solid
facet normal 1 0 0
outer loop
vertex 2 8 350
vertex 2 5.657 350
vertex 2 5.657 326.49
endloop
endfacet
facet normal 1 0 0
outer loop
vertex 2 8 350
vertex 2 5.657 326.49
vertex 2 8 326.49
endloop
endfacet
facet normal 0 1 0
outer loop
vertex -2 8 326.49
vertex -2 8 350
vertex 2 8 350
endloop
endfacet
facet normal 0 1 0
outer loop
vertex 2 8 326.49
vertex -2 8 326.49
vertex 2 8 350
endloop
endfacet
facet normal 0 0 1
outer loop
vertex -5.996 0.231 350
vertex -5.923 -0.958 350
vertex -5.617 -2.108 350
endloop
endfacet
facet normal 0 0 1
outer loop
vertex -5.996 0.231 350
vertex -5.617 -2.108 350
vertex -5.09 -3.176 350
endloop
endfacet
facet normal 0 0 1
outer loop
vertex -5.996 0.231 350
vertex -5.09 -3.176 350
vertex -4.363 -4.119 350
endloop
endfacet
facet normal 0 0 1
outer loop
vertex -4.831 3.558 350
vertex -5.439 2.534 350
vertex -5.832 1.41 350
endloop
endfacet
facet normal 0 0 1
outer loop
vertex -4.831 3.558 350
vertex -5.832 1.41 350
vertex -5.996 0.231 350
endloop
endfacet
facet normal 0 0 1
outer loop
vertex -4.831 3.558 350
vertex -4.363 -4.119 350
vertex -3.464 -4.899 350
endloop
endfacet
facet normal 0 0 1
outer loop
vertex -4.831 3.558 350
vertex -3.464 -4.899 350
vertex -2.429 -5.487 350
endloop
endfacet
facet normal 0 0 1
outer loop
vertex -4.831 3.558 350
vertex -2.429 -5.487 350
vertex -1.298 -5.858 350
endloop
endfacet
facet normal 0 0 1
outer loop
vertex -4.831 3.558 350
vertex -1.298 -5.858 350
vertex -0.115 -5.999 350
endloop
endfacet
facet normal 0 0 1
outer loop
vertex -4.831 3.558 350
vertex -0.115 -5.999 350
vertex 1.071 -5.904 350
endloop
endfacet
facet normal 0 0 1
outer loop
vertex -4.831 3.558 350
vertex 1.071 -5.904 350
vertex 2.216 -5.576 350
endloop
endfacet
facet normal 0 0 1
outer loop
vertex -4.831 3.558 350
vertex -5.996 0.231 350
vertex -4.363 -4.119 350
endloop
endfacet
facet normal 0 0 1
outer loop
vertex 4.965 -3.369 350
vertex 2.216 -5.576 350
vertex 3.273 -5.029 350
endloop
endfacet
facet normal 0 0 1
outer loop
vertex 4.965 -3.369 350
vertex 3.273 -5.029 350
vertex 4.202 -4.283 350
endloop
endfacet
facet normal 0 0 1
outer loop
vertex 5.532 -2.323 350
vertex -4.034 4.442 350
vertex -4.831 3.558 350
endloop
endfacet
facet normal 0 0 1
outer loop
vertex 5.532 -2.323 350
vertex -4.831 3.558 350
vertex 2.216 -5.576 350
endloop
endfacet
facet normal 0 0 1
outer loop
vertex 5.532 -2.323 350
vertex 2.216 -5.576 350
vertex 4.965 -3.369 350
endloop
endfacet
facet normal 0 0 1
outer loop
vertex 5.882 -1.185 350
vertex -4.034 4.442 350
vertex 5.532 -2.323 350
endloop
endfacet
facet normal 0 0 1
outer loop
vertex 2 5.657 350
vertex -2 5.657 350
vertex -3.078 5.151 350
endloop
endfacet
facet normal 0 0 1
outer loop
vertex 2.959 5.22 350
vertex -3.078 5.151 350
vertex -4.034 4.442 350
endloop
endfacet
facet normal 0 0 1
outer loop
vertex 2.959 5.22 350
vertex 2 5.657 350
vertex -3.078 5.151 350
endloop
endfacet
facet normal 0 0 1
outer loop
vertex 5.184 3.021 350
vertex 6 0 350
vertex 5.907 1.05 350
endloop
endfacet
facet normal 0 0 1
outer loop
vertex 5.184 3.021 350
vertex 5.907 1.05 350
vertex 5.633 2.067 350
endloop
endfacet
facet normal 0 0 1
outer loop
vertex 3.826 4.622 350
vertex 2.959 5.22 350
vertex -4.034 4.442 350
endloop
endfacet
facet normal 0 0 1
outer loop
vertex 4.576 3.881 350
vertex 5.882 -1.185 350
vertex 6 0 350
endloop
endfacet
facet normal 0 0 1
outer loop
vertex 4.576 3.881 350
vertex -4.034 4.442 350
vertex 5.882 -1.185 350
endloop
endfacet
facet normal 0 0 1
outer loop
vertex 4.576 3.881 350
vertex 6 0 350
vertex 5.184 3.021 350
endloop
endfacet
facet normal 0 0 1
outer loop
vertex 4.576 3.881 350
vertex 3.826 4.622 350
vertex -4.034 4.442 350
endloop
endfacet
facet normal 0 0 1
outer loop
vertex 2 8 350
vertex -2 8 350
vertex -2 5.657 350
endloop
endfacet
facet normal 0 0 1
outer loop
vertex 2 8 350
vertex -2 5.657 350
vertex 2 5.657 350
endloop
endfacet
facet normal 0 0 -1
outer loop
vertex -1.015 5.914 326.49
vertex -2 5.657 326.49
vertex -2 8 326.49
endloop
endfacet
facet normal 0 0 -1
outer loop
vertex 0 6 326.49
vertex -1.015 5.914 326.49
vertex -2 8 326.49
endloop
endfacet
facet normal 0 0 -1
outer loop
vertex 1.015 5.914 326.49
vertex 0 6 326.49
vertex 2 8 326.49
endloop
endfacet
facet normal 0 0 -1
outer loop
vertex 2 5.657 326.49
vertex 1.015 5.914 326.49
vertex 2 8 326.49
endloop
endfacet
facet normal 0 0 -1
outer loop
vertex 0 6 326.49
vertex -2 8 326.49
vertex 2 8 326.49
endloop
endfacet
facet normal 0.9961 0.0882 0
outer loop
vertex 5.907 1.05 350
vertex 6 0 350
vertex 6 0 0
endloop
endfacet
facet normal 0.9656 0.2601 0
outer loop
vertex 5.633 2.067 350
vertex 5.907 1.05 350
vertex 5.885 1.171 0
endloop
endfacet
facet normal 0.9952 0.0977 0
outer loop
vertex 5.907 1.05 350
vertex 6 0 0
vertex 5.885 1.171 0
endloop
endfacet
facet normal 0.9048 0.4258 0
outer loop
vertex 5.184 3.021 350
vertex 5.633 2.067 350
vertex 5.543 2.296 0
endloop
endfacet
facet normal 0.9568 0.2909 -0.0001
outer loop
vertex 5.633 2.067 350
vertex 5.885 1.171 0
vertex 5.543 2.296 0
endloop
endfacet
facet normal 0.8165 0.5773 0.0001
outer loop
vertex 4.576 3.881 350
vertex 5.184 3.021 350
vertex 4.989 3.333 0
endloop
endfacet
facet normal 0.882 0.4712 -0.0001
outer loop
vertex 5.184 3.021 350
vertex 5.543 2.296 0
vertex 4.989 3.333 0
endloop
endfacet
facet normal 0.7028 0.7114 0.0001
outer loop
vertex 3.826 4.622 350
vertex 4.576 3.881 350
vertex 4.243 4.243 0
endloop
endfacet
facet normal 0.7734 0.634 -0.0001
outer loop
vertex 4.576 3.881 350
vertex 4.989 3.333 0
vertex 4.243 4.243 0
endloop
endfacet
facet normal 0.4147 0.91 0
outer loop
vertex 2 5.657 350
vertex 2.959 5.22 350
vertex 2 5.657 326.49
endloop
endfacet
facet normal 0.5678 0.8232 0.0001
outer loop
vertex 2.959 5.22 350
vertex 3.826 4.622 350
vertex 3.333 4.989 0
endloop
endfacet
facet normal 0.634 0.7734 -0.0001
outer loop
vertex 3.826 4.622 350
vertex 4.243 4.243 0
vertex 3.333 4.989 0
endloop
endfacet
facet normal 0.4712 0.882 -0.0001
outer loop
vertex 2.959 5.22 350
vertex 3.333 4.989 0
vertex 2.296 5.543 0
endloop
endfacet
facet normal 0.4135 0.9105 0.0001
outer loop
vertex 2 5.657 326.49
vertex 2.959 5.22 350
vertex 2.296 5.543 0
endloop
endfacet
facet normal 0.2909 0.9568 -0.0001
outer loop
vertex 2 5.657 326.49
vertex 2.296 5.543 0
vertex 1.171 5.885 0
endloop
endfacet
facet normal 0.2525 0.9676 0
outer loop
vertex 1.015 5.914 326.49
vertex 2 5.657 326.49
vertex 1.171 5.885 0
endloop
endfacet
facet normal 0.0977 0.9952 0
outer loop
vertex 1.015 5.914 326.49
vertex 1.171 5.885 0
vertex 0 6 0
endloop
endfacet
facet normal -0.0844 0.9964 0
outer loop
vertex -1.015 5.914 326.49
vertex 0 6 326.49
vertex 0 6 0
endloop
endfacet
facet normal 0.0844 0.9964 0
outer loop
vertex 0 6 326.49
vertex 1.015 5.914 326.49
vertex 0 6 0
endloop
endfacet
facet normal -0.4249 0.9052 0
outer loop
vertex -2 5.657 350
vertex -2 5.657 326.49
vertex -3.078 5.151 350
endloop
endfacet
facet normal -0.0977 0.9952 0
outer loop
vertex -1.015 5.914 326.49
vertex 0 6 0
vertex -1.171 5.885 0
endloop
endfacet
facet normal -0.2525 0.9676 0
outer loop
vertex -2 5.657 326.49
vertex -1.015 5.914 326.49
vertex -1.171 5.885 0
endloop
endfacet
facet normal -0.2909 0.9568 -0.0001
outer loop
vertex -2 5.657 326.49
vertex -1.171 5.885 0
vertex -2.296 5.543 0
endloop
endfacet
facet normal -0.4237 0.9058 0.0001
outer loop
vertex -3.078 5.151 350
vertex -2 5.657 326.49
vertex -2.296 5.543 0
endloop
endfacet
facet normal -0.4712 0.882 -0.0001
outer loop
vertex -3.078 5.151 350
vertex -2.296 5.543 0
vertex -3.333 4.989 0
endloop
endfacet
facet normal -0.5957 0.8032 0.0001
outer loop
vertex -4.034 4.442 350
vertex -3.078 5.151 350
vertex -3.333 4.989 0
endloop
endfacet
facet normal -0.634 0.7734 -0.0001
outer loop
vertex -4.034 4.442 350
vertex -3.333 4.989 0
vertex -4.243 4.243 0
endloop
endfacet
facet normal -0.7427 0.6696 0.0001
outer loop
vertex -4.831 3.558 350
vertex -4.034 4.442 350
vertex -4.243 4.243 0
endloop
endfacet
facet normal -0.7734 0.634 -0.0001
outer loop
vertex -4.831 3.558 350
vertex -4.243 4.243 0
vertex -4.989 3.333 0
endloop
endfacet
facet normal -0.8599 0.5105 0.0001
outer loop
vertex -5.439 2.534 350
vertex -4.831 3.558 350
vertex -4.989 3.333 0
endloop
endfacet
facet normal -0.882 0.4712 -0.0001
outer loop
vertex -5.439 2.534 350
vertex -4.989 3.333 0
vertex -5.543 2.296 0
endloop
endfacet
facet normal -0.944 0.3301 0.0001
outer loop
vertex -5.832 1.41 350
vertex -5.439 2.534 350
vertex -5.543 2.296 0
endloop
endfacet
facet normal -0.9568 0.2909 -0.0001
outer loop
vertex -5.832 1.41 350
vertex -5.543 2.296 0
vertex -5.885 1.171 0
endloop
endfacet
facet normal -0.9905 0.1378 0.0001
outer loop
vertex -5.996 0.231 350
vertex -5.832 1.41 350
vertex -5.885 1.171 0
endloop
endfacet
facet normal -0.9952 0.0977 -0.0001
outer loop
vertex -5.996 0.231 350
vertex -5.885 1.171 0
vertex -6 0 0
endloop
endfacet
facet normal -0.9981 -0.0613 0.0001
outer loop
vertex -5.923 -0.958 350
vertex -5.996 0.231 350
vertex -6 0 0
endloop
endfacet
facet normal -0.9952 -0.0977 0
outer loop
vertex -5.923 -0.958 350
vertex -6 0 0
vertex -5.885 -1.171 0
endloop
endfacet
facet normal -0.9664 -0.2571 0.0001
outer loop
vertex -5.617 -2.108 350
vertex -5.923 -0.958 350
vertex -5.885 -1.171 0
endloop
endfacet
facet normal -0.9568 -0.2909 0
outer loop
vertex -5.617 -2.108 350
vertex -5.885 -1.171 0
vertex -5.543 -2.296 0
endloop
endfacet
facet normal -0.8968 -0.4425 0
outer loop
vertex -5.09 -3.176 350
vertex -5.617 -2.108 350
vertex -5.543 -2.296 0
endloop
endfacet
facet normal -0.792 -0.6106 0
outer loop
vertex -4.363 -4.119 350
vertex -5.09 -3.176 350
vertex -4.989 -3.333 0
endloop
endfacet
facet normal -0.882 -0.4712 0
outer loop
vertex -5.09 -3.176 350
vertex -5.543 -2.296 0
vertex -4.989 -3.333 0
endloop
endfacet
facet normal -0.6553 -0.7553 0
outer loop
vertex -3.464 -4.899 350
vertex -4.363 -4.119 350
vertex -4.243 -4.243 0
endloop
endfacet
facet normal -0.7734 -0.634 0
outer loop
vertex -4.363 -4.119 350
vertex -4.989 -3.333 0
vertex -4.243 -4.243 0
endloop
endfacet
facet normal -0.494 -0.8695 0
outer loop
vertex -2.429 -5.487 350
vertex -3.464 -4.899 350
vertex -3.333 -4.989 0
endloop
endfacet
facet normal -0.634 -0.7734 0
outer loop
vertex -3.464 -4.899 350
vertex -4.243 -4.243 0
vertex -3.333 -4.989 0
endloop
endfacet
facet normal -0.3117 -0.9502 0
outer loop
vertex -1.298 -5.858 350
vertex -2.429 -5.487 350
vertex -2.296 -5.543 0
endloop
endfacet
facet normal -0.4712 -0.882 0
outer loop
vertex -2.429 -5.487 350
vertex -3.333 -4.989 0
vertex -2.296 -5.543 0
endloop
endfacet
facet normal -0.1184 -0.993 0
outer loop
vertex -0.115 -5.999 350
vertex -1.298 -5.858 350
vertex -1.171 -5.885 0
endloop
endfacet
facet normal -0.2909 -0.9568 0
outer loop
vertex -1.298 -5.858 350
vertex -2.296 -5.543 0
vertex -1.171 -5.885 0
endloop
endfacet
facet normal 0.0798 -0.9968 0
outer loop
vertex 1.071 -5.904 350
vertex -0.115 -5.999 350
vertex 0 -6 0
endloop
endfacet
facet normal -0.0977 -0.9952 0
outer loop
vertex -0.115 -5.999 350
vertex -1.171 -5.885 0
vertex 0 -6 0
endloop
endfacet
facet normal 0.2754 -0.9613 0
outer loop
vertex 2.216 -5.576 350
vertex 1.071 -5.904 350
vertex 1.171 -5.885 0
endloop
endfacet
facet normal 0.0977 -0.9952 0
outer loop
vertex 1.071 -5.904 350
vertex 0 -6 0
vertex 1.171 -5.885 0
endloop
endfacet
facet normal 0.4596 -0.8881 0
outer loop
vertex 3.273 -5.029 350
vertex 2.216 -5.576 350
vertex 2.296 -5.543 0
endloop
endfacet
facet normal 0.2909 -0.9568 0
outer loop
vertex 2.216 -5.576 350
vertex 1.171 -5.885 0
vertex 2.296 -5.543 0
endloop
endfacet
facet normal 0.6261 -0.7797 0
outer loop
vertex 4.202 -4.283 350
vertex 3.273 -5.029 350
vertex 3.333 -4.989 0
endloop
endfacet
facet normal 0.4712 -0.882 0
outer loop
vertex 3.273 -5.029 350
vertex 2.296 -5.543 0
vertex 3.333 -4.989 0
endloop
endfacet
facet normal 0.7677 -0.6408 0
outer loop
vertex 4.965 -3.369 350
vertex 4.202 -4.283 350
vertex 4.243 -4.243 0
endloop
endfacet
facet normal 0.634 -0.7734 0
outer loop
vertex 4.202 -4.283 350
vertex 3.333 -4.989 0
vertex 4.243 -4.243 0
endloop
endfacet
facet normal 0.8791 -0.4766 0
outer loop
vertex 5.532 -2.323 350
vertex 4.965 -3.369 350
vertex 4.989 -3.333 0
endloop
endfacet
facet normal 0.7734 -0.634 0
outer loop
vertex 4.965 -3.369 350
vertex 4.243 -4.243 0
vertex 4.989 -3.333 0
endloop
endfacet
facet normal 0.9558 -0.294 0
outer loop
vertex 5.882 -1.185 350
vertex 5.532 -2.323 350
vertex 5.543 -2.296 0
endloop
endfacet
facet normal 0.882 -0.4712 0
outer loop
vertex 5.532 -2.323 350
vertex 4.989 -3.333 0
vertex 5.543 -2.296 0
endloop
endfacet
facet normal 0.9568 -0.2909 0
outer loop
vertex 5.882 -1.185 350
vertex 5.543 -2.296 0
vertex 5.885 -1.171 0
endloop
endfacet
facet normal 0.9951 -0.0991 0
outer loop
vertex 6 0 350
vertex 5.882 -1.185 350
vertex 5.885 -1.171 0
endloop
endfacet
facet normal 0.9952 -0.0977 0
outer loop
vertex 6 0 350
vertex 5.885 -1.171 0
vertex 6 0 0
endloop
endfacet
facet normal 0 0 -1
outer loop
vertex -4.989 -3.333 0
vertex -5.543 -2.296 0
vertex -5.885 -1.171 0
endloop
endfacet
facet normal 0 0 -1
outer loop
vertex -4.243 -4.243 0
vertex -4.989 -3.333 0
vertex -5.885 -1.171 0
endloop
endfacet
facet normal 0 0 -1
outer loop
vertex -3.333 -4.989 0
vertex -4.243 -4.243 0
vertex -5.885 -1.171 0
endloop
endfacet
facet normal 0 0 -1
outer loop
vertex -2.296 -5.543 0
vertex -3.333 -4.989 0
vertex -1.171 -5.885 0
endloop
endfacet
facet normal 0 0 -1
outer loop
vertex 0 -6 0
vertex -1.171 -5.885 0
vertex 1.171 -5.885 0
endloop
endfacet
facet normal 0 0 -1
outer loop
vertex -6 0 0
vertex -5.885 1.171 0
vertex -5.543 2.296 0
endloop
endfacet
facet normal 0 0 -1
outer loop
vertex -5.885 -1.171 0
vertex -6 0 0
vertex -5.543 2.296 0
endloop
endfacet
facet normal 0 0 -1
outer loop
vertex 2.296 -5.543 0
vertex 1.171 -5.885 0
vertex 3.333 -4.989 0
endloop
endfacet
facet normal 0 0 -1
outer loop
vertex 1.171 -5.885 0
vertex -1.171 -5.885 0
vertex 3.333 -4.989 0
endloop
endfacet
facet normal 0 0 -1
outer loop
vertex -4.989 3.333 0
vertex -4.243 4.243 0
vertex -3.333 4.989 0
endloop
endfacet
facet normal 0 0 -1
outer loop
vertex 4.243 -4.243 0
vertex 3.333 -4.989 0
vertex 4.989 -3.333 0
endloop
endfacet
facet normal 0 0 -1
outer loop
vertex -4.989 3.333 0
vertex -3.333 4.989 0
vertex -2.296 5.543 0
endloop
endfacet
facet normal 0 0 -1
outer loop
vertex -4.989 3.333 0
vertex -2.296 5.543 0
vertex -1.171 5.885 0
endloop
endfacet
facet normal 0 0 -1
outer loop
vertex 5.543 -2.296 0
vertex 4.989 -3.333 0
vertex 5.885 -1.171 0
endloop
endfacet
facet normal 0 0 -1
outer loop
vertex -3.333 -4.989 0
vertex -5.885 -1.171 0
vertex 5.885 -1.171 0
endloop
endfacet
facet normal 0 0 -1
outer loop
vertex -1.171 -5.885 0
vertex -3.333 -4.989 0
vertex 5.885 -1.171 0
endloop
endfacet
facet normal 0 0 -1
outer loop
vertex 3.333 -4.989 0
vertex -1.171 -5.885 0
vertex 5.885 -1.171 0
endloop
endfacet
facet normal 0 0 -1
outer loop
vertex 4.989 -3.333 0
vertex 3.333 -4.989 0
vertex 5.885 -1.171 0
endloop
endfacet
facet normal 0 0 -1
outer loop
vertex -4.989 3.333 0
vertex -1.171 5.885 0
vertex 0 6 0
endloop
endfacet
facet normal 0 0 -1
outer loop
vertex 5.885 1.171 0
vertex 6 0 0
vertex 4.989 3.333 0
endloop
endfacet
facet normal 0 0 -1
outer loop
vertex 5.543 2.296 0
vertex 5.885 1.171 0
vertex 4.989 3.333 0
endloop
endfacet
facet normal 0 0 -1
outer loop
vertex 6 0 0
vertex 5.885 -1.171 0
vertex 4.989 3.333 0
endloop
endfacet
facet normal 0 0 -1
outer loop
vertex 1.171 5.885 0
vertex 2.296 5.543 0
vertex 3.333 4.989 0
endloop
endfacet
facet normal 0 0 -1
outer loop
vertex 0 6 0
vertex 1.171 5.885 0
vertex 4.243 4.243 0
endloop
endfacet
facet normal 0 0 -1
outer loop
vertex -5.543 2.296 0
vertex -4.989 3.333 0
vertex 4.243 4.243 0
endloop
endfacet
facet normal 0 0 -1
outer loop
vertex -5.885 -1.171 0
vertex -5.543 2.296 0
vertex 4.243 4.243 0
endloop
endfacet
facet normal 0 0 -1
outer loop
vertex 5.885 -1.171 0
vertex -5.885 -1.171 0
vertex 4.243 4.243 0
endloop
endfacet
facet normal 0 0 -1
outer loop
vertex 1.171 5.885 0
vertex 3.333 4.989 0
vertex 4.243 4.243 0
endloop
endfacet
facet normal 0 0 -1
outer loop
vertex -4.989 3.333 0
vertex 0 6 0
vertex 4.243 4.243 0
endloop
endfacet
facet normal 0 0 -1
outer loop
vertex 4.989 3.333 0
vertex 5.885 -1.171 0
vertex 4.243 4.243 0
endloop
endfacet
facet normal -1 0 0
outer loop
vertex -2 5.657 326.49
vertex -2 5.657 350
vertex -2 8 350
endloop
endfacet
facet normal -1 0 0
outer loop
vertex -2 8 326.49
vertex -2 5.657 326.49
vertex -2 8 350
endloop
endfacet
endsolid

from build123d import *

# Parameters (mm, degrees)
SKETCH_1_R      = 6
EXTRUDE_1_DEPTH = 350
SKETCH_2_W      = 4
SKETCH_2_H      = 9.160592614
EXTRUDE_2_DEPTH = 23.51


with BuildPart() as part:
    # 草图1 → 凸台-拉伸1 (new body)
    with BuildSketch(Plane.XY):
        Circle(SKETCH_1_R)
    extrude(amount=EXTRUDE_1_DEPTH)

    # 草图2 → 凸台-拉伸2 (add)
    with BuildSketch(Plane.XY.offset(350)):
        with Locations((0, 3.419703693)):
            Rectangle(SKETCH_2_W, SKETCH_2_H)
    extrude(amount=-EXTRUDE_2_DEPTH)


solid = part.part
